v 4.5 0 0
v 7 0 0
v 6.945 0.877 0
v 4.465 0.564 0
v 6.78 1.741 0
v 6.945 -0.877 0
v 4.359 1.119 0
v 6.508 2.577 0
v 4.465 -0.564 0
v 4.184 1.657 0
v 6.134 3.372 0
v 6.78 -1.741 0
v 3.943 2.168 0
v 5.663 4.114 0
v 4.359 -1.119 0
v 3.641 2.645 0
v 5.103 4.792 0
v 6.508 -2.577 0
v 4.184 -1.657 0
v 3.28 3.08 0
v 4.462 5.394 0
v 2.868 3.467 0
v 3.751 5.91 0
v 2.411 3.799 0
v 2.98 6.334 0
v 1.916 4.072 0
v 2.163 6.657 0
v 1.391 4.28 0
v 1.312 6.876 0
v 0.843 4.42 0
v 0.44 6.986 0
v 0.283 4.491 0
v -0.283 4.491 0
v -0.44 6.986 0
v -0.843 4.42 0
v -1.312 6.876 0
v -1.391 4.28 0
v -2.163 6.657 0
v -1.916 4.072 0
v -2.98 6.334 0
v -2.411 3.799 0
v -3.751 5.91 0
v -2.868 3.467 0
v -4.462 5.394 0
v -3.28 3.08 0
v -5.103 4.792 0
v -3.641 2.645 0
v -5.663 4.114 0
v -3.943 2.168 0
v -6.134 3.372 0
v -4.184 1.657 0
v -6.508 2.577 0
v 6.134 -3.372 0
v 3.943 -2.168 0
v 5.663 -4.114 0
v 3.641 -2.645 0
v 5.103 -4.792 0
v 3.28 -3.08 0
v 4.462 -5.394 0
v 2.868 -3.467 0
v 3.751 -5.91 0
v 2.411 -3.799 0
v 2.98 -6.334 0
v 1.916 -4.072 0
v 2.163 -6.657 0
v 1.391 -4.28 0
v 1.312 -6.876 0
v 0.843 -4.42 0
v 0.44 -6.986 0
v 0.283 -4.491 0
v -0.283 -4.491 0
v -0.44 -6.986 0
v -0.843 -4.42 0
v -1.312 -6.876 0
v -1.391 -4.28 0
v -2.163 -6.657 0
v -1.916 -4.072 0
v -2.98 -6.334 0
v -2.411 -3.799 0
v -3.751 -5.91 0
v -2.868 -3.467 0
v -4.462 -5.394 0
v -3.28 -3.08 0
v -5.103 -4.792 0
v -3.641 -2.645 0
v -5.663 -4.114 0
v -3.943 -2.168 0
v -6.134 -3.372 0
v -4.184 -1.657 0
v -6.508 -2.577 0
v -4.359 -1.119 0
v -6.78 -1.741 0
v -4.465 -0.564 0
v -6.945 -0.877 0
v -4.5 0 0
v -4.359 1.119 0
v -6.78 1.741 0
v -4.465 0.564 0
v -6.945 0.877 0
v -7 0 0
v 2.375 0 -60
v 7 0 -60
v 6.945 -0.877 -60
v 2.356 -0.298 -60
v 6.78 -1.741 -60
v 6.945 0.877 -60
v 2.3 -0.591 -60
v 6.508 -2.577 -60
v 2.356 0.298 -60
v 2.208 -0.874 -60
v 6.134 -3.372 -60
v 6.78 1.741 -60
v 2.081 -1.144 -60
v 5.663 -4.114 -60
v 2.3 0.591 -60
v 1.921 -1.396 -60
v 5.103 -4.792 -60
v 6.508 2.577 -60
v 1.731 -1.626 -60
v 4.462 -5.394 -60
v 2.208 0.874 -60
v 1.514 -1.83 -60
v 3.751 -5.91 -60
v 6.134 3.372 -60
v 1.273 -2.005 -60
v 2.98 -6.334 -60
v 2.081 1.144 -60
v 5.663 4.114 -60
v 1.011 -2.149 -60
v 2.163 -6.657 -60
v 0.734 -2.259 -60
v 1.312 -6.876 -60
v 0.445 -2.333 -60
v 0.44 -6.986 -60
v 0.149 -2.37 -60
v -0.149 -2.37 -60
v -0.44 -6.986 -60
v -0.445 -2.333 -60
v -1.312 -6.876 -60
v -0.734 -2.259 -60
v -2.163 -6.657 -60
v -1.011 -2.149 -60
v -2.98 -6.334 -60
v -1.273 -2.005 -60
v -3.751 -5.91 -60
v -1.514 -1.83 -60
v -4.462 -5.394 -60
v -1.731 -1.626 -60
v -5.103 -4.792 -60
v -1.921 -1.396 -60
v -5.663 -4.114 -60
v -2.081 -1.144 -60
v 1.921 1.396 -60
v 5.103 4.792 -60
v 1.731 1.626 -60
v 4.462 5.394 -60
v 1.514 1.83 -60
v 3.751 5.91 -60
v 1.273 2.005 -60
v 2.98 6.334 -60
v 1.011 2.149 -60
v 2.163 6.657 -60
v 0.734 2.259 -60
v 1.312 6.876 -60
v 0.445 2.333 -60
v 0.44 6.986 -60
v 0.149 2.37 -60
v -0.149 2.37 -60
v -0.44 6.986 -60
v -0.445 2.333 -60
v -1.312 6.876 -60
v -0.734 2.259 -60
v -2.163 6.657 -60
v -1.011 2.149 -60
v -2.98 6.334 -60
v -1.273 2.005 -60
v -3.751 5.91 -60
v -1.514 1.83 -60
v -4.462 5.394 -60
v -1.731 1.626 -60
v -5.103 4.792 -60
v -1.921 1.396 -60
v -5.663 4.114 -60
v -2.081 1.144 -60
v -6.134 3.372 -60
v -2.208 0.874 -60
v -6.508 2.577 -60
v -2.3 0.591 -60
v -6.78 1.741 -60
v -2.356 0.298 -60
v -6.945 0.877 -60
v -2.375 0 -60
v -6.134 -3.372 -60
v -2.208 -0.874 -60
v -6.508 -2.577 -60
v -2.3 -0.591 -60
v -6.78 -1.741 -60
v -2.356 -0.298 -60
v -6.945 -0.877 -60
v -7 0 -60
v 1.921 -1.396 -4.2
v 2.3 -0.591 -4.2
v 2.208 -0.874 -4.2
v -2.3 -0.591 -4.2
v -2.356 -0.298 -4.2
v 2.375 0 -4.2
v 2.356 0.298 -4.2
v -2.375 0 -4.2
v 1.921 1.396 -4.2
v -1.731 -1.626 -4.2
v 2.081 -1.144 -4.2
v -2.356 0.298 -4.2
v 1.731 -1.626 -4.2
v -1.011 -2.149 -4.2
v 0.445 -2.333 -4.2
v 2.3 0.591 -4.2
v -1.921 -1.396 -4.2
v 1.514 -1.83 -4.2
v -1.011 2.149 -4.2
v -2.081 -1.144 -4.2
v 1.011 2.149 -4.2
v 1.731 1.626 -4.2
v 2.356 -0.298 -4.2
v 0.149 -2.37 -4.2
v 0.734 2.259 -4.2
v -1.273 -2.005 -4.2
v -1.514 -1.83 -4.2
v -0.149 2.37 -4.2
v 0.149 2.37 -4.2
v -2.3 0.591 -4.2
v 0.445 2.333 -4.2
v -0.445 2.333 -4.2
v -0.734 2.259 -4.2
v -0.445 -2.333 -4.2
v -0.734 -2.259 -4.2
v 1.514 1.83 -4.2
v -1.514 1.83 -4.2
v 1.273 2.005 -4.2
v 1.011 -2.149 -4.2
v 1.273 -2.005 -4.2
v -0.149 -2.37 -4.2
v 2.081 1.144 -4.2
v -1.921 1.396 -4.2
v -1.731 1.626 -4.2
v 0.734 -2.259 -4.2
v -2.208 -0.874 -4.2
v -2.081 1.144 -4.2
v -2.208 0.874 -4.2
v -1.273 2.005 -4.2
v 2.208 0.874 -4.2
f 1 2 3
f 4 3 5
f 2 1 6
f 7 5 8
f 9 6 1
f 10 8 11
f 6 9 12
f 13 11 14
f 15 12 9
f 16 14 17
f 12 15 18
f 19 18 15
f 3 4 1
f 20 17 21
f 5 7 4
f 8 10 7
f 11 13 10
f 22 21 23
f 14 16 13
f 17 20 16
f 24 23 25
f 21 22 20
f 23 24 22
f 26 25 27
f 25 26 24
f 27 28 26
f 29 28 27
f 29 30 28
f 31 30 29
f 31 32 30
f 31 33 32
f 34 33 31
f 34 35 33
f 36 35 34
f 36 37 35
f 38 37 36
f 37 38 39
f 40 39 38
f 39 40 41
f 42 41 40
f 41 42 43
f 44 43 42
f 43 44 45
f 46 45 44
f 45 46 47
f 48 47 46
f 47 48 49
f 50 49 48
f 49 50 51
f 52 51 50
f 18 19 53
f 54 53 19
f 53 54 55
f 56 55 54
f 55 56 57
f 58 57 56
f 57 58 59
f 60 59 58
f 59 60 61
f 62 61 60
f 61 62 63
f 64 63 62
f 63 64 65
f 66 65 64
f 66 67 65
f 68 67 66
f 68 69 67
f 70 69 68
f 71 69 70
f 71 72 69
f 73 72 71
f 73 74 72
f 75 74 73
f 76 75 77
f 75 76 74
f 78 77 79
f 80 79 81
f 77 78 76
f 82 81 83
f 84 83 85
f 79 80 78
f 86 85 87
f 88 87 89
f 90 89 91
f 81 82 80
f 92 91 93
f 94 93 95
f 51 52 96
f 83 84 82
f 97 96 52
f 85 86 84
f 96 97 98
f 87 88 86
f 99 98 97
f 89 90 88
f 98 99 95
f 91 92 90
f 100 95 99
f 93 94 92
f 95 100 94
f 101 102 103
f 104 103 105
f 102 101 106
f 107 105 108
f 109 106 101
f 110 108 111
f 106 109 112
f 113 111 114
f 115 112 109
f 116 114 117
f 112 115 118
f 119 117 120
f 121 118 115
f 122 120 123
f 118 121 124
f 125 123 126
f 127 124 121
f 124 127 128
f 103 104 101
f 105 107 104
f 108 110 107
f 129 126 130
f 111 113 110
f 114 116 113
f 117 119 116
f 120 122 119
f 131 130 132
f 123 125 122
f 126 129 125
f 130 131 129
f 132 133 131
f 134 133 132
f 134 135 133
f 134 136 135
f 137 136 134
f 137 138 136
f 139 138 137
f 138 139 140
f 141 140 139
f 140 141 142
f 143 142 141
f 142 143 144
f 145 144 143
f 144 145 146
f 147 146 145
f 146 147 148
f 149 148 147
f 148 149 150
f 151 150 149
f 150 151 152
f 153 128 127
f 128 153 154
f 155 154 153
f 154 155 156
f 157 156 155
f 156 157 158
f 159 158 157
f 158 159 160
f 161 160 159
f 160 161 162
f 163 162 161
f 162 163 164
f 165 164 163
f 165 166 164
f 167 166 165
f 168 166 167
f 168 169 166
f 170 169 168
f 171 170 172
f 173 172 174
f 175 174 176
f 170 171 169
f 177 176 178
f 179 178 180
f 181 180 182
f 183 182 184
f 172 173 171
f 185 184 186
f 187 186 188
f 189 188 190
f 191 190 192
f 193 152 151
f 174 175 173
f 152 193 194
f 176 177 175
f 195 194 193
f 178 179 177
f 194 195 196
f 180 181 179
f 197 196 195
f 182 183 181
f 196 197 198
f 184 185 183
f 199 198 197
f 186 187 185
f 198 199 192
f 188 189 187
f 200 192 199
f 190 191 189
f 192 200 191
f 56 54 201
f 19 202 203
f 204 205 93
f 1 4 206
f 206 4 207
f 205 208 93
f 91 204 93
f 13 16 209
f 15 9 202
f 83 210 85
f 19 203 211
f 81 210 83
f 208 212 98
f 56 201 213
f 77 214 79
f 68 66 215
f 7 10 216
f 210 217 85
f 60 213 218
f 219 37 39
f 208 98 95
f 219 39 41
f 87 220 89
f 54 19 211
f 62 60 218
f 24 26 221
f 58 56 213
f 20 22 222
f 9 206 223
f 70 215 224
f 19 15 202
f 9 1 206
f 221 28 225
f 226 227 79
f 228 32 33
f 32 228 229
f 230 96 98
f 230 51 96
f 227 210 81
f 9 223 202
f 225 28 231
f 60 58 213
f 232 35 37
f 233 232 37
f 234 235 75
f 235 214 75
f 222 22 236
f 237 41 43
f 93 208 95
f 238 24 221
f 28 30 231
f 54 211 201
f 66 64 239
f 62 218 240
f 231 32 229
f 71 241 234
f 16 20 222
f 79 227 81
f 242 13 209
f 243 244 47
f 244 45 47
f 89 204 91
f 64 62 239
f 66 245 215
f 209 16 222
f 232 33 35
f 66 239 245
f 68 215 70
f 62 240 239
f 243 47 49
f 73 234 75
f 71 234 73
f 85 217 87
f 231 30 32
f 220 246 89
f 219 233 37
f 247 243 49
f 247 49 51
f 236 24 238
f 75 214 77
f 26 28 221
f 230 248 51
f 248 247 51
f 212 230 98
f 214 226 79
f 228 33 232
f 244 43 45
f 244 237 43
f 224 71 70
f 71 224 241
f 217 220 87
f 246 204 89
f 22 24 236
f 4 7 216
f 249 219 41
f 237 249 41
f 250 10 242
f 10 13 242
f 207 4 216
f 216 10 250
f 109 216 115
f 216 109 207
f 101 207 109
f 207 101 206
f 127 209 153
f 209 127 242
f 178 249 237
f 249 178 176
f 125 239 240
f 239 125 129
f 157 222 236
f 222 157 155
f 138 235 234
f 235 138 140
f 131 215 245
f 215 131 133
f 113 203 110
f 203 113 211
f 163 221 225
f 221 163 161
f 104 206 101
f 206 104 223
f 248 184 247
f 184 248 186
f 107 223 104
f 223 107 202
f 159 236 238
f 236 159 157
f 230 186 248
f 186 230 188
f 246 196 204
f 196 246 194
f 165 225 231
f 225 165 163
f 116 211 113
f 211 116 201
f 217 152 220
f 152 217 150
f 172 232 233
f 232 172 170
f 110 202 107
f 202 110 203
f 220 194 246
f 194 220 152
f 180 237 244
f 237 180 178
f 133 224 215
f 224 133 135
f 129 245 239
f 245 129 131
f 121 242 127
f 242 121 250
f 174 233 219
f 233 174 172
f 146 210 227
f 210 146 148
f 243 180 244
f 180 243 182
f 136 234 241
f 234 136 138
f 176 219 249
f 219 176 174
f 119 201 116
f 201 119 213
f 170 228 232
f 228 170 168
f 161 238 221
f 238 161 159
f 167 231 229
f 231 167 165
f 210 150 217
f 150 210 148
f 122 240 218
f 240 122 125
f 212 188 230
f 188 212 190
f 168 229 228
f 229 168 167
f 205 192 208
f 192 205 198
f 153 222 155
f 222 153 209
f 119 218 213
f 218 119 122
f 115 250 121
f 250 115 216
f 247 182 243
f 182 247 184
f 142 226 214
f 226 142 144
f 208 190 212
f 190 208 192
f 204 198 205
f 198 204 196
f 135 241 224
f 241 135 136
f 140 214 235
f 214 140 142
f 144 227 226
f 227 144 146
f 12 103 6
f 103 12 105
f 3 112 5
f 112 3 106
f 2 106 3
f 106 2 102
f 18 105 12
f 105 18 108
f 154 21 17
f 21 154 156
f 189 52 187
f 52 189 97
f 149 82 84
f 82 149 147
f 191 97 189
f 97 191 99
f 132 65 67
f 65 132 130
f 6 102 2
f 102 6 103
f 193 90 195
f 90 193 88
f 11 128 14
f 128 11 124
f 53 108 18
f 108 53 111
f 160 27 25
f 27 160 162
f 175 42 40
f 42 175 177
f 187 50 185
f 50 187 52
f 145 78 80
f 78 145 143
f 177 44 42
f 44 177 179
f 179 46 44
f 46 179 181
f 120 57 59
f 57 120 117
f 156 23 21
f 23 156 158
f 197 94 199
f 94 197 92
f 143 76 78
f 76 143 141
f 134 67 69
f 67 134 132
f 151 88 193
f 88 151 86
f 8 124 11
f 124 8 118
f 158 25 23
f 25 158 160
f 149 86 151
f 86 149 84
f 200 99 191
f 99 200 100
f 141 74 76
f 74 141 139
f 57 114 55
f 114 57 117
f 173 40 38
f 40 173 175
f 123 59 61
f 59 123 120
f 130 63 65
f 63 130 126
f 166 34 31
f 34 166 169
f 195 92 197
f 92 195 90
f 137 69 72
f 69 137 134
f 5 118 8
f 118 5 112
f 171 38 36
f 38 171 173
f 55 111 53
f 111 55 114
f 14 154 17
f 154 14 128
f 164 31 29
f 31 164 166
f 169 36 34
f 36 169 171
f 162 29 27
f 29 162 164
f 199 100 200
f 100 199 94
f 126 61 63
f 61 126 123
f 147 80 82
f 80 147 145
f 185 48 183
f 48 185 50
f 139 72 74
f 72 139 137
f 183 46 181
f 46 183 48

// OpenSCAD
$fn = 50;


difference() {
	union() {
		translate(v = [0, 0, -60.0000000000]) {
			cylinder(h = 60, r = 7.0000000000);
		}
		cylinder(h = 0, r = 10.0000000000);
	}
	union() {
		translate(v = [0, 0, 0]) {
			rotate(a = [0, 0, 0]) {
				difference() {
					union() {
						#translate(v = [0, 0, -60.0000000000]) {
							cylinder(h = 60, r = 2.2500000000);
						}
						#translate(v = [0, 0, -4.2000000000]) {
							cylinder(h = 4.2000000000, r = 7.0000000000, r1 = 2.3750000000, r2 = 4.5000000000);
						}
						#translate(v = [0, 0, -60.0000000000]) {
							cylinder(h = 60, r = 2.3750000000);
						}
						#translate(v = [0, 0, -60.0000000000]) {
							cylinder(h = 60, r = 2.2500000000);
						}
					}
					union();
				}
			}
		}
	}
}
